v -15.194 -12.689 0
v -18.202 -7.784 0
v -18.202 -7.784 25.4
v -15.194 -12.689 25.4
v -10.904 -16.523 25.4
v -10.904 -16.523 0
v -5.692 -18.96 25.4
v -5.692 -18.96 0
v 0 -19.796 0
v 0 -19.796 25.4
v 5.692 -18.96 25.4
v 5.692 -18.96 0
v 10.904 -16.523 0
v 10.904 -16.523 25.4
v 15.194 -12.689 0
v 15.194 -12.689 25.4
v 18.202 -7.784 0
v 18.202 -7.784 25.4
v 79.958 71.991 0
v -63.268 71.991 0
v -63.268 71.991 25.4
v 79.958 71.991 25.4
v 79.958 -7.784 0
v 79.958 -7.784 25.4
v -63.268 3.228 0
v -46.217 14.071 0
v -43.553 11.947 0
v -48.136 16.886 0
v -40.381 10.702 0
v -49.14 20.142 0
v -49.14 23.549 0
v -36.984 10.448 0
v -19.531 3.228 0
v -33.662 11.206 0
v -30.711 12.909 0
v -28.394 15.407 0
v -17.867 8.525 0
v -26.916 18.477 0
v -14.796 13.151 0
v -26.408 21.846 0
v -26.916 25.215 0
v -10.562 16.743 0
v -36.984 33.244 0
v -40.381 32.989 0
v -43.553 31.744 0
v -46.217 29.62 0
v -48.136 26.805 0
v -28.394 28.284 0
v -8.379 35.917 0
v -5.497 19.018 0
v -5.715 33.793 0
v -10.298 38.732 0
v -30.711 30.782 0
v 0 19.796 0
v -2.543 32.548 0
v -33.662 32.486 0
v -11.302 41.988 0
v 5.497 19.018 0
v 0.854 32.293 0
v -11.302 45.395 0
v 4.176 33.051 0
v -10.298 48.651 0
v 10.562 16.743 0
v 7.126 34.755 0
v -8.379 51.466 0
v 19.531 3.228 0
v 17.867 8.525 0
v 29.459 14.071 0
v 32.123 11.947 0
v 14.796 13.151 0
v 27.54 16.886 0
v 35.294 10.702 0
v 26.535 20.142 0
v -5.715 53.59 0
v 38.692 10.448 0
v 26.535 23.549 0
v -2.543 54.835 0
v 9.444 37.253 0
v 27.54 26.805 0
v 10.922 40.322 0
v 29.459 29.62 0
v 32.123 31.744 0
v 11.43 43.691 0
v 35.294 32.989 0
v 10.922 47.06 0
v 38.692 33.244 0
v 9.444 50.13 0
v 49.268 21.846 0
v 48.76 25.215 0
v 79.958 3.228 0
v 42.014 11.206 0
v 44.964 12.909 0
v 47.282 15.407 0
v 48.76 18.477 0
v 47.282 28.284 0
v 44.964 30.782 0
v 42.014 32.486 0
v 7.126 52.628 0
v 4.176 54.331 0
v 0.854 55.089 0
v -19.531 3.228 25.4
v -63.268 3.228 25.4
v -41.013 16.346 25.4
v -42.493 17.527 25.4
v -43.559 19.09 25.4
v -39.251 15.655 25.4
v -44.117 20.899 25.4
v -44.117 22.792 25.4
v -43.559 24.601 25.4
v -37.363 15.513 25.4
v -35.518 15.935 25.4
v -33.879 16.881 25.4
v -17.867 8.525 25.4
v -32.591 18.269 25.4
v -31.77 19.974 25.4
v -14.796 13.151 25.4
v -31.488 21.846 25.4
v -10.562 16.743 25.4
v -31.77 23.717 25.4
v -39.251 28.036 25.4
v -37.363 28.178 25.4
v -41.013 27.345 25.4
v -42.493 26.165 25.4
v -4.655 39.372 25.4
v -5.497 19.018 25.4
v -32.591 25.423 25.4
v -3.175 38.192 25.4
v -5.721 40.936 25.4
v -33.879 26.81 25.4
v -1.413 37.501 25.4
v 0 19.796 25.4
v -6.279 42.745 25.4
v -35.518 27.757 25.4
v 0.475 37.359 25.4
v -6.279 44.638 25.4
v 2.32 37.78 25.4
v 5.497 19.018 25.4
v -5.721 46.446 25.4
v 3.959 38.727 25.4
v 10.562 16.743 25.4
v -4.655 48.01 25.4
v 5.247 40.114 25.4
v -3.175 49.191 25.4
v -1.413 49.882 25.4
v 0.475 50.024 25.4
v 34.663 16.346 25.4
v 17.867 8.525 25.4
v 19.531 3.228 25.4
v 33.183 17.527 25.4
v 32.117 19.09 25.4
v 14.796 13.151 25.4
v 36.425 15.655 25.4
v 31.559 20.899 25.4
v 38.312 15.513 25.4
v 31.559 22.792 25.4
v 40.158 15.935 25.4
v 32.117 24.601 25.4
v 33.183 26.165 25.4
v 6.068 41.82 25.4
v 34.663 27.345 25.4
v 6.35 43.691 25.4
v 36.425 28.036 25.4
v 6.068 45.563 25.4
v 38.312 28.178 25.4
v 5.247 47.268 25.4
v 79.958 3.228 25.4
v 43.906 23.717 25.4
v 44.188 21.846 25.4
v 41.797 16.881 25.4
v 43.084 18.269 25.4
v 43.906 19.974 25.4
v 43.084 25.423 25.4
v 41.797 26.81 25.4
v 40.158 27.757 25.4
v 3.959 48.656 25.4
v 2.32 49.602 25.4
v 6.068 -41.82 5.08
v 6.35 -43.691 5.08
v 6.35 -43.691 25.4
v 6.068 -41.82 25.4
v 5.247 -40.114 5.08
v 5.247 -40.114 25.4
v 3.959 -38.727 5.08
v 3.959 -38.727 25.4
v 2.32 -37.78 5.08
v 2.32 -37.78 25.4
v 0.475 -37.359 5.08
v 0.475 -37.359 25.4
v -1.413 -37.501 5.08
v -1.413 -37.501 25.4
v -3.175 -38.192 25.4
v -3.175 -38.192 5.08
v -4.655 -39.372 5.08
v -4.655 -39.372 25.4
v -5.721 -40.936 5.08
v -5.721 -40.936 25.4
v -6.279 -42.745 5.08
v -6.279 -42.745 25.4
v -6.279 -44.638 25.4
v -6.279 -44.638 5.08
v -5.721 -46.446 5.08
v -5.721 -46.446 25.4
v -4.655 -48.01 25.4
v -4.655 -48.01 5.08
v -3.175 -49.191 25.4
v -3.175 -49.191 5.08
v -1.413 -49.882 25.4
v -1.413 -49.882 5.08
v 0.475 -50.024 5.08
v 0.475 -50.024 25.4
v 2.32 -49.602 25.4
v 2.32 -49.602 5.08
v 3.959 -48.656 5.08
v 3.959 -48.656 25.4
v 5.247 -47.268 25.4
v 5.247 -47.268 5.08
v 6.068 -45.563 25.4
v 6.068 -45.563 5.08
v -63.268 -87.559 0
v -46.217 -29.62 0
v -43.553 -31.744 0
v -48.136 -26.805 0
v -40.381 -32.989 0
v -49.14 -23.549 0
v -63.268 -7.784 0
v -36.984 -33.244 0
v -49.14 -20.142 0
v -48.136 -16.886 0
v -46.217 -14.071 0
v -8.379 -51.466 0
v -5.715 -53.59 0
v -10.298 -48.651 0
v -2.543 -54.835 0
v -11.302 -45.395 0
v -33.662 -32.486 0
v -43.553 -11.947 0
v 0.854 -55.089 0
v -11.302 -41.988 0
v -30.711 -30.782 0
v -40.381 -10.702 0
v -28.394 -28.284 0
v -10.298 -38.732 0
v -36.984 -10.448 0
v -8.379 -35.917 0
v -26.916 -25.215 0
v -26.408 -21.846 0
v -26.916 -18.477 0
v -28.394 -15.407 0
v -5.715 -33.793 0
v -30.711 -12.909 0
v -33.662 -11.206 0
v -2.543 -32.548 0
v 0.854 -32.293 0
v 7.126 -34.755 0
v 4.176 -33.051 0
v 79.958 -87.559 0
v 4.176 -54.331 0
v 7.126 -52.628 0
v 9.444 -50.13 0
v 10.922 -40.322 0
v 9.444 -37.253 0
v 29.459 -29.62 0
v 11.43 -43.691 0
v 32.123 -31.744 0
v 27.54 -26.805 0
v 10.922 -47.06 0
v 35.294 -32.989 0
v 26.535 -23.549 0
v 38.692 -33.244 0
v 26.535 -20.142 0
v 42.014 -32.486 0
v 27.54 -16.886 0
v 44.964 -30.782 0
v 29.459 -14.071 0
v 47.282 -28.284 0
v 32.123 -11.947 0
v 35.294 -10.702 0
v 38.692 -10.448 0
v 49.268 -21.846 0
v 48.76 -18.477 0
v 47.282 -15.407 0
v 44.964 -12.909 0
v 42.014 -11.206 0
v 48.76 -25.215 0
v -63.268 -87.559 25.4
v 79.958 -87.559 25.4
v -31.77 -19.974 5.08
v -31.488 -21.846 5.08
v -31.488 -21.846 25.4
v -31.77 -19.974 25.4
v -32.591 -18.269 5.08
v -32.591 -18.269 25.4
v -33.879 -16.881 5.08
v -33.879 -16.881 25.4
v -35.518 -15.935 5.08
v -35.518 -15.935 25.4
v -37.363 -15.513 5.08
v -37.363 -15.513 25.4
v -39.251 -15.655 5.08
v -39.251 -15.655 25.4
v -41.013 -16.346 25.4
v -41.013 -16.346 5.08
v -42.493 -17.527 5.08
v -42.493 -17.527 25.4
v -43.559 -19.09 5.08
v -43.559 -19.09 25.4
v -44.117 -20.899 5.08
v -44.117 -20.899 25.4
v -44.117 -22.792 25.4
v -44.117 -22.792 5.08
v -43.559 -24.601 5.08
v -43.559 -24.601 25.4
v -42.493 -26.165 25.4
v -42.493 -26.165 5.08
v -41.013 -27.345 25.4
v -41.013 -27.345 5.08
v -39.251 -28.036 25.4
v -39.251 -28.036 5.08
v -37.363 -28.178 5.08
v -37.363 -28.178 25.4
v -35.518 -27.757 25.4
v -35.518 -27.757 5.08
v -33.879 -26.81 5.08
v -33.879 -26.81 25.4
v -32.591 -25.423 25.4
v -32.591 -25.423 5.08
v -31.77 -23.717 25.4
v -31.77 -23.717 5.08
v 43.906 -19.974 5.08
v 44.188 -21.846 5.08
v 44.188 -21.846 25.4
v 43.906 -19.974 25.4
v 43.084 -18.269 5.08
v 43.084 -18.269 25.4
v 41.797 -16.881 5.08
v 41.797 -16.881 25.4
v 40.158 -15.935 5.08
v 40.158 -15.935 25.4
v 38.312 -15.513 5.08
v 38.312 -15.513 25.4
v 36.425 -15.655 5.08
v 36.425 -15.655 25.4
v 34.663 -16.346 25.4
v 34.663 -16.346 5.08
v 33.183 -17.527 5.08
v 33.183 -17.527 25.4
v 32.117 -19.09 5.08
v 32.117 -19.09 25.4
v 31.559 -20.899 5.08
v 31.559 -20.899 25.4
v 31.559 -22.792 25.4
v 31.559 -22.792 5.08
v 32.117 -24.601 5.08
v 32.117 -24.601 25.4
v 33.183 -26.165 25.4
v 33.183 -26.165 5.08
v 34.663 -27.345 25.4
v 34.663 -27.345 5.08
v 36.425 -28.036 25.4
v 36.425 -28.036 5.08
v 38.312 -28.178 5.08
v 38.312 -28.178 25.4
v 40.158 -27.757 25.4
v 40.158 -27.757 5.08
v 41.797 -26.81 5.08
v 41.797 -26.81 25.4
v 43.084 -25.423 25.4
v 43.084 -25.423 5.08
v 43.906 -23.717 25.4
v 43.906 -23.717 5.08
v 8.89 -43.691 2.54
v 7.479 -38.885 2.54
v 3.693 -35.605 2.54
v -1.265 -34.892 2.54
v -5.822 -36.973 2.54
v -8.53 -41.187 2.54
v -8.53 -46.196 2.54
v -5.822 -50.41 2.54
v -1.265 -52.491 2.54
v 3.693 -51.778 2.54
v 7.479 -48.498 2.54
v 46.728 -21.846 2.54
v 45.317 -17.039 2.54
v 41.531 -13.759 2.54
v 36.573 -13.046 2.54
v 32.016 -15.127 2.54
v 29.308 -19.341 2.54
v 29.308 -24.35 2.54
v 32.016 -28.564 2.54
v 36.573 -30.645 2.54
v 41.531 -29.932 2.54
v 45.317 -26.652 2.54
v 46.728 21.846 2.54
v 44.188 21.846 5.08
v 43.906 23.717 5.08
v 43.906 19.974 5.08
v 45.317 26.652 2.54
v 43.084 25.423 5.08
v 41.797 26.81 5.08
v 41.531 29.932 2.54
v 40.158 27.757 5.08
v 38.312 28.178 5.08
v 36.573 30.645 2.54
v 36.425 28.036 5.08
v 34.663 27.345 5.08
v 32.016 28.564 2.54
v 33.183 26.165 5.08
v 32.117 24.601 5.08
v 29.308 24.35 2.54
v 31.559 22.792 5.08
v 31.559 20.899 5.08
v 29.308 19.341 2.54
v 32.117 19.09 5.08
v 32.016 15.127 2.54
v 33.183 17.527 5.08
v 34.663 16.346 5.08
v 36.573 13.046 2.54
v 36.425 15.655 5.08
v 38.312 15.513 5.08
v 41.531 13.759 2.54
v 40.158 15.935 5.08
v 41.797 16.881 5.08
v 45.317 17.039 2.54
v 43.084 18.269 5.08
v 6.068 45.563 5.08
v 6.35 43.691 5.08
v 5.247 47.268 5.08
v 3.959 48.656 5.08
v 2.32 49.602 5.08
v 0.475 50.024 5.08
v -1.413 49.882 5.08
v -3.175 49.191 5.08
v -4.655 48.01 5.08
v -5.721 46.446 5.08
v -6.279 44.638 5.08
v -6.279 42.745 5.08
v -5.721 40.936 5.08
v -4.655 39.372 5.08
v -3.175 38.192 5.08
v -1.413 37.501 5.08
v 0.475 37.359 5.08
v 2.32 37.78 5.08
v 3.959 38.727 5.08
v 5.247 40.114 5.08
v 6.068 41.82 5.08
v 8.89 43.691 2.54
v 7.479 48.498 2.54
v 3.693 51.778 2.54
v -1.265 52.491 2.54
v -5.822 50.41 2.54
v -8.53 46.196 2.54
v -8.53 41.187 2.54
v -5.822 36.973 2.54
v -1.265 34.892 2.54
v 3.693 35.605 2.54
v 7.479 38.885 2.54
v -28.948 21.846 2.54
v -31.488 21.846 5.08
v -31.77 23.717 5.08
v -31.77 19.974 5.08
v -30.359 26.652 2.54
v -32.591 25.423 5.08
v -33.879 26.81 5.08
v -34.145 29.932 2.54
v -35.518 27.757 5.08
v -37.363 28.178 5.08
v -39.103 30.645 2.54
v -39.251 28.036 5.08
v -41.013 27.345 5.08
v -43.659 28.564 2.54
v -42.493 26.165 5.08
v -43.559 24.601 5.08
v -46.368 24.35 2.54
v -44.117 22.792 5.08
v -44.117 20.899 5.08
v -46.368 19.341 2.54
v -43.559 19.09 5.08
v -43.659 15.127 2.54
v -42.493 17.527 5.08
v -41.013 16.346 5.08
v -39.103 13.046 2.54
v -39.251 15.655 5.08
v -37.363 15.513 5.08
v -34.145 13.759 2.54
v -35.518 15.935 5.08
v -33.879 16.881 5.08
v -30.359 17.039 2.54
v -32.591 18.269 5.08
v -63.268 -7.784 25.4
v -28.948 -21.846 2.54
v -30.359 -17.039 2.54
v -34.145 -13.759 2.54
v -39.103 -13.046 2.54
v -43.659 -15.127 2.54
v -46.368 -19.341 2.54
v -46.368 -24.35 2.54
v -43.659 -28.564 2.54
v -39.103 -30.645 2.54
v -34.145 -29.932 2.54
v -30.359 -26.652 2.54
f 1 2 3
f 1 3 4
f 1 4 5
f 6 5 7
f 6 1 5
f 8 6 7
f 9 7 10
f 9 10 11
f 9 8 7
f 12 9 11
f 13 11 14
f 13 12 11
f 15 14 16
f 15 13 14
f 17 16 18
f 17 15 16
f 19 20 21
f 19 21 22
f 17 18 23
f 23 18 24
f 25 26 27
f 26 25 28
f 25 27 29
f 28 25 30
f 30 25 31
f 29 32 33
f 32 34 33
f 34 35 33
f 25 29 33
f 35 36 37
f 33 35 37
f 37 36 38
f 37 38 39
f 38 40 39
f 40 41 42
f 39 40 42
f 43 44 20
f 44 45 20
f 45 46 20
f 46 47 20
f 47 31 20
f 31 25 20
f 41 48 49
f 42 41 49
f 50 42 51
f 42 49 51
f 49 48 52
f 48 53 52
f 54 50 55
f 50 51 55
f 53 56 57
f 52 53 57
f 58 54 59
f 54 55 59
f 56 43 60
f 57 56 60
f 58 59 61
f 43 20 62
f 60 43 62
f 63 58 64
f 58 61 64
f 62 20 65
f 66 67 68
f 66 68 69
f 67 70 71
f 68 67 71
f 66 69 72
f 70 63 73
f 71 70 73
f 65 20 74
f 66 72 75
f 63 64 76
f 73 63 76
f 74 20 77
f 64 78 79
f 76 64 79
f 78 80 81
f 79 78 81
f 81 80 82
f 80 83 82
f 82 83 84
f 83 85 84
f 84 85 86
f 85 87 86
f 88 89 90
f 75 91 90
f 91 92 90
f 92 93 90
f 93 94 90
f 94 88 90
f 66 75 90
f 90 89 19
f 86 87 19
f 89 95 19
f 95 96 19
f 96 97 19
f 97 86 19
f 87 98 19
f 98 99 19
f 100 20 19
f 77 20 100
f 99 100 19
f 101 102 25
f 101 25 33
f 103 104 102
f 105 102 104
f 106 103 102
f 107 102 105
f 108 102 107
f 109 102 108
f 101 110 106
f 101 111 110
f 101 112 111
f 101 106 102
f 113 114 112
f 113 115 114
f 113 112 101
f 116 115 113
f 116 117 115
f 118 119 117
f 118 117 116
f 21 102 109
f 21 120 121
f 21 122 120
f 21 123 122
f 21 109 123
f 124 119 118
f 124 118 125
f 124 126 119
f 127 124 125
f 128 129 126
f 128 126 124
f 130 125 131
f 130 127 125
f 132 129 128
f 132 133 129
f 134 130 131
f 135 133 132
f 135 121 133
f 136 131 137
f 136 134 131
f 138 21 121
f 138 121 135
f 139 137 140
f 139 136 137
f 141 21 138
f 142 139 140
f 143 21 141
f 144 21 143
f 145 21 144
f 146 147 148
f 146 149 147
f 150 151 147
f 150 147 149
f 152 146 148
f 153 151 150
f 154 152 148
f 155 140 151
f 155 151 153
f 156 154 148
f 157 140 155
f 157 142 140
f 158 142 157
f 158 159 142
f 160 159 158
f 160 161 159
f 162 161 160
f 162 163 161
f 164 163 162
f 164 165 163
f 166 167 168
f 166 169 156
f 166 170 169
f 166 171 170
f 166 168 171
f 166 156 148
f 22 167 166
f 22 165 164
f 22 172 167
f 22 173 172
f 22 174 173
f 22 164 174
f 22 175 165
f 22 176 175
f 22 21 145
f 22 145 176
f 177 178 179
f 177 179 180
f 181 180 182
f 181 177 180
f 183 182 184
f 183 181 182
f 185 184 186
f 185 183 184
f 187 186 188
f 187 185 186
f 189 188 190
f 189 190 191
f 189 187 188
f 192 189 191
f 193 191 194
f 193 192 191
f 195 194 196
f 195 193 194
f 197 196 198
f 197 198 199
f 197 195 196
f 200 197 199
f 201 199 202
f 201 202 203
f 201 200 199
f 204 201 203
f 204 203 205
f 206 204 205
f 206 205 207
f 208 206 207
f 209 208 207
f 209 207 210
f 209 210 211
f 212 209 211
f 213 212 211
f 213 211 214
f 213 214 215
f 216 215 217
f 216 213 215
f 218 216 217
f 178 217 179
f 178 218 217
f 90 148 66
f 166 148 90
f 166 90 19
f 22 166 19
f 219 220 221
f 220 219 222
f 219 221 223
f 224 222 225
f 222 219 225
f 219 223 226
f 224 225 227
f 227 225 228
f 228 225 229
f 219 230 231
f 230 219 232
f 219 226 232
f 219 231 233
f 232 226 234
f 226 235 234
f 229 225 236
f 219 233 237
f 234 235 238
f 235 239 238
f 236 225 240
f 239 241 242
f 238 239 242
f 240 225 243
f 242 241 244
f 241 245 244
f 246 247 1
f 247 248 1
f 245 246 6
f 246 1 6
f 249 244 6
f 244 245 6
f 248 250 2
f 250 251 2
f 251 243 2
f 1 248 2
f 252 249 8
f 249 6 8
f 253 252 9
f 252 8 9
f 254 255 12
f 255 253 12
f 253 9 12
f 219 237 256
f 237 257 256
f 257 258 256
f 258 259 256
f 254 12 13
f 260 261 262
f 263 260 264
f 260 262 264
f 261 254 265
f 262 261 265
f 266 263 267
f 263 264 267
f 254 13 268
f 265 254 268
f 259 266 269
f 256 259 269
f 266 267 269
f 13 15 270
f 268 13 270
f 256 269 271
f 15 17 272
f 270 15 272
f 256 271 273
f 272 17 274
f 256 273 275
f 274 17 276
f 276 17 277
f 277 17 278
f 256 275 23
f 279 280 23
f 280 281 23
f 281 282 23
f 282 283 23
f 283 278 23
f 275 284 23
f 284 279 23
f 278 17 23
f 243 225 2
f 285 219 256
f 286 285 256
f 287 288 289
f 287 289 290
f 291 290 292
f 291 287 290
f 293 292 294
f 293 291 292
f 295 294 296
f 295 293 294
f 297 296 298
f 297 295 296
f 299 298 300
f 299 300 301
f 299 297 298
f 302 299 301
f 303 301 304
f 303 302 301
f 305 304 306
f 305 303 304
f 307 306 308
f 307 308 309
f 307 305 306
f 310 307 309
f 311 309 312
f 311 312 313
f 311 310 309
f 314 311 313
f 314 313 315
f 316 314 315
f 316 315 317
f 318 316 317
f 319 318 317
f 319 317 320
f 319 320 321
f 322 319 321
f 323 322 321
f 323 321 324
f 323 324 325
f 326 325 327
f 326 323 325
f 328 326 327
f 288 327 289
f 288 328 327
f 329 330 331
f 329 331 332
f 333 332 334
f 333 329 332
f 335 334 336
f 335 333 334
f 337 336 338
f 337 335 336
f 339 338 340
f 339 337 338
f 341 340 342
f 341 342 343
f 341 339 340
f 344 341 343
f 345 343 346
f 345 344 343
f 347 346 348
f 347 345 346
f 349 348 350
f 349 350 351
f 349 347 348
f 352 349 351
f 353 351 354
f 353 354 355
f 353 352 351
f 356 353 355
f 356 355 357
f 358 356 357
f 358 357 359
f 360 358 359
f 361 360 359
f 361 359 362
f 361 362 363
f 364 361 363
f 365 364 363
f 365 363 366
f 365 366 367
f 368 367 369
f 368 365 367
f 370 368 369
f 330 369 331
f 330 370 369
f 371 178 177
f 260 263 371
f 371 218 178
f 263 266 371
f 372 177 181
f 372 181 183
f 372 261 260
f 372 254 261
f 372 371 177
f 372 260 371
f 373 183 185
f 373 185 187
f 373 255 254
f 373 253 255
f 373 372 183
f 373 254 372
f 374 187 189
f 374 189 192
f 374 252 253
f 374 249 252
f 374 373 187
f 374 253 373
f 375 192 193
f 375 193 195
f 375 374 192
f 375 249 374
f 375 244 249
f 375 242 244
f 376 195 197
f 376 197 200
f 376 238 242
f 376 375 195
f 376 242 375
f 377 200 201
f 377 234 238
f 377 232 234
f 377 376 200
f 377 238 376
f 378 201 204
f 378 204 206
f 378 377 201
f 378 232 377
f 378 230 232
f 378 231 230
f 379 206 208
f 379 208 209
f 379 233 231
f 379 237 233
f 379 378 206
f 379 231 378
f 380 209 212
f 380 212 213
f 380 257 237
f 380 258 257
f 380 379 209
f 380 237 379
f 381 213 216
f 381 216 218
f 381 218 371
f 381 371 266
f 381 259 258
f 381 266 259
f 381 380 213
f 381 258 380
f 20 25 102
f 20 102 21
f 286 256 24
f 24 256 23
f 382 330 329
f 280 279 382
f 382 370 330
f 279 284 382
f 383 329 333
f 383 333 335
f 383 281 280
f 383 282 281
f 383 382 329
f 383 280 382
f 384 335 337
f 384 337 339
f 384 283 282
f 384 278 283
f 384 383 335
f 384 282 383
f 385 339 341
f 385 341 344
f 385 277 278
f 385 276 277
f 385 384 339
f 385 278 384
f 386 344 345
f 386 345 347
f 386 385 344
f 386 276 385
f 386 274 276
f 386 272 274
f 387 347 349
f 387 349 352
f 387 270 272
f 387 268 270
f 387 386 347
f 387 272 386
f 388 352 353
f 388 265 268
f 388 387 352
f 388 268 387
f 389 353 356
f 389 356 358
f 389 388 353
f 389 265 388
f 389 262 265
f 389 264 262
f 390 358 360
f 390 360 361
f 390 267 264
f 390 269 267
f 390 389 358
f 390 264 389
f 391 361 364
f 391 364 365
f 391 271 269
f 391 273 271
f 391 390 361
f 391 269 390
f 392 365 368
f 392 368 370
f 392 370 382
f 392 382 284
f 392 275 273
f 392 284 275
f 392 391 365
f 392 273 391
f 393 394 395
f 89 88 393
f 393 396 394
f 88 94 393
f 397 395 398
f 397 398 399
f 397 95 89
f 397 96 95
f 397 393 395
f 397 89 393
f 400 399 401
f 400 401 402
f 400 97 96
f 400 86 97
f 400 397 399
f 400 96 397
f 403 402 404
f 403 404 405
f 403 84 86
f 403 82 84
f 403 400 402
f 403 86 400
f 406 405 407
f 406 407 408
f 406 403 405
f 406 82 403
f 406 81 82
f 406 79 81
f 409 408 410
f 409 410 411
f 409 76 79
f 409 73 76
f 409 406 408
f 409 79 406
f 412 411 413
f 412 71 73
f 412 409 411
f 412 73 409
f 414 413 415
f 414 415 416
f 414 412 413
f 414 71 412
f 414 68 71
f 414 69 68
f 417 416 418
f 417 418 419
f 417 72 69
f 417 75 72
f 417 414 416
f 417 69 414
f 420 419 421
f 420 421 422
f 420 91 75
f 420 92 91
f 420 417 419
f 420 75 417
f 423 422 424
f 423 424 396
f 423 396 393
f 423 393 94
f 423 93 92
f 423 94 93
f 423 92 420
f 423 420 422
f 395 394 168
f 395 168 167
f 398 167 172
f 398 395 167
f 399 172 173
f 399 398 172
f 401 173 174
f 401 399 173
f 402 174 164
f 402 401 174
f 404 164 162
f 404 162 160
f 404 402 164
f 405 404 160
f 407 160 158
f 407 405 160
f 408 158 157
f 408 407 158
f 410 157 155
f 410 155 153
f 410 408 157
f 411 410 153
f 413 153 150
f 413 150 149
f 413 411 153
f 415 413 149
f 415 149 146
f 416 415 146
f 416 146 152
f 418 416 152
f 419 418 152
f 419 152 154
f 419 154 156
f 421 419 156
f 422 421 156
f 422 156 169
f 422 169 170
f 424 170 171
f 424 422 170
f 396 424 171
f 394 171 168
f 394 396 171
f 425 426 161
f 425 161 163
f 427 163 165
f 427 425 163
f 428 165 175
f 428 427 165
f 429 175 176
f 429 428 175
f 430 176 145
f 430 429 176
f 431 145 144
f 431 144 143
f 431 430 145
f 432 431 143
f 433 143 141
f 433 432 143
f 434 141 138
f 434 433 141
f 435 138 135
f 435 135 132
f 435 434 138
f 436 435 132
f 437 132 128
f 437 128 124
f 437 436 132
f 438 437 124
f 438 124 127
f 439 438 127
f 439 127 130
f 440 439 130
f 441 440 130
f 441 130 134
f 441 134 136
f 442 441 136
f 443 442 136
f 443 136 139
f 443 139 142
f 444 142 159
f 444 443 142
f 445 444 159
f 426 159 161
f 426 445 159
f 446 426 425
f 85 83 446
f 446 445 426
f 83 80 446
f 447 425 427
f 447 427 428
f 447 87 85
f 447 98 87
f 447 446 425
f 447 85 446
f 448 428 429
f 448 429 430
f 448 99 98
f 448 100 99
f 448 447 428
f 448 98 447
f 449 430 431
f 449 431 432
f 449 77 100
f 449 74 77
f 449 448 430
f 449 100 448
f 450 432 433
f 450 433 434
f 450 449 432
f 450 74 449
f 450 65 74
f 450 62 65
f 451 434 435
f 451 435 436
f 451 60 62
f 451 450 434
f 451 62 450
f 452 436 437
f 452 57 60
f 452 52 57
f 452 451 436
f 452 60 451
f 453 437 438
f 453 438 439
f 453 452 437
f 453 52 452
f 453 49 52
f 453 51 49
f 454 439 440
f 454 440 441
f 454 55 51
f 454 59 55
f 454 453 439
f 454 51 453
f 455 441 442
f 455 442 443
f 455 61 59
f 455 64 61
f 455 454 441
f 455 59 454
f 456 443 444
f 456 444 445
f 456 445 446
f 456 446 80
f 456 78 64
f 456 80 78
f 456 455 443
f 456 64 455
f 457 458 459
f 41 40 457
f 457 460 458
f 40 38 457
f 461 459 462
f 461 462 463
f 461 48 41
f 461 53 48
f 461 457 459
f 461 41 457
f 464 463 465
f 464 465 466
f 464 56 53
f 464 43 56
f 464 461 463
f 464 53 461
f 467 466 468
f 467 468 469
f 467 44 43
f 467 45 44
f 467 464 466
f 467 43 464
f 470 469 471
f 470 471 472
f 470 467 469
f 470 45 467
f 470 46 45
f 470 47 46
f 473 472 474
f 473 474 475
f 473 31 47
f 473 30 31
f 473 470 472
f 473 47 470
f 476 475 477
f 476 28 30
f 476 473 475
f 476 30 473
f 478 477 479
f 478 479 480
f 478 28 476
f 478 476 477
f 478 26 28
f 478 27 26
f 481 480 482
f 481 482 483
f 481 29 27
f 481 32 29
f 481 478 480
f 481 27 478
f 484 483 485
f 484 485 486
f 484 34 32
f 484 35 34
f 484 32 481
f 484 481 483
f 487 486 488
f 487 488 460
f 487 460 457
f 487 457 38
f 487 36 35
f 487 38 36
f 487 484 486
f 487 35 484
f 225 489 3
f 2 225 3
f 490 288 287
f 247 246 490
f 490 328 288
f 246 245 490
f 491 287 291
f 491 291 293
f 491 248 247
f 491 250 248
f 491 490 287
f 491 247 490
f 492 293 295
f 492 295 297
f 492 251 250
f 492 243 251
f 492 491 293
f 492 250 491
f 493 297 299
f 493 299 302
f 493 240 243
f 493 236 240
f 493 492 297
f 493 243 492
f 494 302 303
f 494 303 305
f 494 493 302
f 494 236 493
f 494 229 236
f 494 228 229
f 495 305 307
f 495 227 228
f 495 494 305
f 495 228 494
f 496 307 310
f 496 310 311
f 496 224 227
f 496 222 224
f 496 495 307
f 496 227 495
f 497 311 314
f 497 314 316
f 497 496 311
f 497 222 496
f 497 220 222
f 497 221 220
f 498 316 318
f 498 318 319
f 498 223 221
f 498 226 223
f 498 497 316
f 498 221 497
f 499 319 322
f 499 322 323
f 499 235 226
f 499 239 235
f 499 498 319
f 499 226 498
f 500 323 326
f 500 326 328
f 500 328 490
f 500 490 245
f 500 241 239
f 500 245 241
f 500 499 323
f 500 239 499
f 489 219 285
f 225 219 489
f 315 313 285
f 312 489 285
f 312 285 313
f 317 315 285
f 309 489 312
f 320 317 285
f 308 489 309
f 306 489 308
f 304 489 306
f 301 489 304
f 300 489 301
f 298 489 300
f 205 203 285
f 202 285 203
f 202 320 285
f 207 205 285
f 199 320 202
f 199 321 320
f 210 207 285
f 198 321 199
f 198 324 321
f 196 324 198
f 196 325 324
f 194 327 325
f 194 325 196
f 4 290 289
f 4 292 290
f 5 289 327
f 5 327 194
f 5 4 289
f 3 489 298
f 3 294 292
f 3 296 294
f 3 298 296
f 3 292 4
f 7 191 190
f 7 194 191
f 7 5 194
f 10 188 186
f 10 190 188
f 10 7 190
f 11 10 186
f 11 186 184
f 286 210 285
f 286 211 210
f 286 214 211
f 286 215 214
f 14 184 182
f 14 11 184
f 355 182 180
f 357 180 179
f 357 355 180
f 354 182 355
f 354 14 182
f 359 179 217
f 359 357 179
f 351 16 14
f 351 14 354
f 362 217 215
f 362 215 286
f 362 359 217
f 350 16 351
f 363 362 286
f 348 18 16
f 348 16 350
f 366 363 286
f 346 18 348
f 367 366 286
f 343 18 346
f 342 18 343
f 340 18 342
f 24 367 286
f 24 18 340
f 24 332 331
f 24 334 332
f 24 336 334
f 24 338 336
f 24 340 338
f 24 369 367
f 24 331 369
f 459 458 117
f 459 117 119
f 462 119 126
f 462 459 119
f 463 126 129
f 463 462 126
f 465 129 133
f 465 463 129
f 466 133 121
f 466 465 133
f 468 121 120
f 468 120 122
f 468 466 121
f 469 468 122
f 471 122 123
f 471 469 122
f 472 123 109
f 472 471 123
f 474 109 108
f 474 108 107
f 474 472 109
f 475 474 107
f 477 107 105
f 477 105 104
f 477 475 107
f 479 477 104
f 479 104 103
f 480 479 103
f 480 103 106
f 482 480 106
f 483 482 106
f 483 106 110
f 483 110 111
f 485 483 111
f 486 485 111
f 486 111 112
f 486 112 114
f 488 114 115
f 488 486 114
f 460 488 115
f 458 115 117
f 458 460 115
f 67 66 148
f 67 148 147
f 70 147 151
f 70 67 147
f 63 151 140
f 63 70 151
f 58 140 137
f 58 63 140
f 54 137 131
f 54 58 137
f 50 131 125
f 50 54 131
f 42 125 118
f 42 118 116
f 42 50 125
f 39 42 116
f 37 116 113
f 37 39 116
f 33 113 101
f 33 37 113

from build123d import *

# Parameters (mm, degrees)
F0_W     = 143.22525
F0_H     = 159.550425
F0_R     = 6.35
F0_R_2   = 19.796196
F1_DEPTH = 25.4
F2_SIZE  = 5.08
F3_W     = 143.22525
F3_H     = 11.012347
F4_DEPTH = 25.4


with BuildPart() as f1:
    # F0 (on Top) → F1 (new body)
    with BuildSketch(Plane.XY):
        with Locations((8.344894, -7.784238)):
            Rectangle(F0_W, F0_H)
        with Locations((-37.837783, -21.845654)):
            Circle(F0_R, mode=Mode.SUBTRACT)
        with Locations((0, -43.691309)):
            Circle(F0_R, mode=Mode.SUBTRACT)
        with Locations((37.837783, -21.845654)):
            Circle(F0_R, mode=Mode.SUBTRACT)
        with Locations((-37.837783, 21.845654)):
            Circle(F0_R, mode=Mode.SUBTRACT)
        Circle(F0_R_2, mode=Mode.SUBTRACT)
        with Locations((0, 43.691309)):
            Circle(F0_R, mode=Mode.SUBTRACT)
        with Locations((37.837783, 21.845654)):
            Circle(F0_R, mode=Mode.SUBTRACT)
    extrude(amount=F1_DEPTH)

    # F2
    f2_edges = [f1.edges().sort_by_distance(p)[0] for p in [
        (-6.35, -43.691309, 0),
        (31.487783, -21.845654, 0),
        (31.487783, 21.845654, 0),
        (-6.35, 43.691309, 0),
        (-44.187783, 21.845654, 0),
        (-44.187783, -21.845654, 0),
    ]]
    chamfer(f2_edges, length=F2_SIZE)

    # F3 (on face) → F4 (cut)
    with BuildSketch(Plane.XY.offset(25.4)):
        with Locations((8.344894, -2.278064)):
            Rectangle(F3_W, F3_H)
    extrude(amount=-F4_DEPTH, mode=Mode.SUBTRACT)


solid = f1.part
